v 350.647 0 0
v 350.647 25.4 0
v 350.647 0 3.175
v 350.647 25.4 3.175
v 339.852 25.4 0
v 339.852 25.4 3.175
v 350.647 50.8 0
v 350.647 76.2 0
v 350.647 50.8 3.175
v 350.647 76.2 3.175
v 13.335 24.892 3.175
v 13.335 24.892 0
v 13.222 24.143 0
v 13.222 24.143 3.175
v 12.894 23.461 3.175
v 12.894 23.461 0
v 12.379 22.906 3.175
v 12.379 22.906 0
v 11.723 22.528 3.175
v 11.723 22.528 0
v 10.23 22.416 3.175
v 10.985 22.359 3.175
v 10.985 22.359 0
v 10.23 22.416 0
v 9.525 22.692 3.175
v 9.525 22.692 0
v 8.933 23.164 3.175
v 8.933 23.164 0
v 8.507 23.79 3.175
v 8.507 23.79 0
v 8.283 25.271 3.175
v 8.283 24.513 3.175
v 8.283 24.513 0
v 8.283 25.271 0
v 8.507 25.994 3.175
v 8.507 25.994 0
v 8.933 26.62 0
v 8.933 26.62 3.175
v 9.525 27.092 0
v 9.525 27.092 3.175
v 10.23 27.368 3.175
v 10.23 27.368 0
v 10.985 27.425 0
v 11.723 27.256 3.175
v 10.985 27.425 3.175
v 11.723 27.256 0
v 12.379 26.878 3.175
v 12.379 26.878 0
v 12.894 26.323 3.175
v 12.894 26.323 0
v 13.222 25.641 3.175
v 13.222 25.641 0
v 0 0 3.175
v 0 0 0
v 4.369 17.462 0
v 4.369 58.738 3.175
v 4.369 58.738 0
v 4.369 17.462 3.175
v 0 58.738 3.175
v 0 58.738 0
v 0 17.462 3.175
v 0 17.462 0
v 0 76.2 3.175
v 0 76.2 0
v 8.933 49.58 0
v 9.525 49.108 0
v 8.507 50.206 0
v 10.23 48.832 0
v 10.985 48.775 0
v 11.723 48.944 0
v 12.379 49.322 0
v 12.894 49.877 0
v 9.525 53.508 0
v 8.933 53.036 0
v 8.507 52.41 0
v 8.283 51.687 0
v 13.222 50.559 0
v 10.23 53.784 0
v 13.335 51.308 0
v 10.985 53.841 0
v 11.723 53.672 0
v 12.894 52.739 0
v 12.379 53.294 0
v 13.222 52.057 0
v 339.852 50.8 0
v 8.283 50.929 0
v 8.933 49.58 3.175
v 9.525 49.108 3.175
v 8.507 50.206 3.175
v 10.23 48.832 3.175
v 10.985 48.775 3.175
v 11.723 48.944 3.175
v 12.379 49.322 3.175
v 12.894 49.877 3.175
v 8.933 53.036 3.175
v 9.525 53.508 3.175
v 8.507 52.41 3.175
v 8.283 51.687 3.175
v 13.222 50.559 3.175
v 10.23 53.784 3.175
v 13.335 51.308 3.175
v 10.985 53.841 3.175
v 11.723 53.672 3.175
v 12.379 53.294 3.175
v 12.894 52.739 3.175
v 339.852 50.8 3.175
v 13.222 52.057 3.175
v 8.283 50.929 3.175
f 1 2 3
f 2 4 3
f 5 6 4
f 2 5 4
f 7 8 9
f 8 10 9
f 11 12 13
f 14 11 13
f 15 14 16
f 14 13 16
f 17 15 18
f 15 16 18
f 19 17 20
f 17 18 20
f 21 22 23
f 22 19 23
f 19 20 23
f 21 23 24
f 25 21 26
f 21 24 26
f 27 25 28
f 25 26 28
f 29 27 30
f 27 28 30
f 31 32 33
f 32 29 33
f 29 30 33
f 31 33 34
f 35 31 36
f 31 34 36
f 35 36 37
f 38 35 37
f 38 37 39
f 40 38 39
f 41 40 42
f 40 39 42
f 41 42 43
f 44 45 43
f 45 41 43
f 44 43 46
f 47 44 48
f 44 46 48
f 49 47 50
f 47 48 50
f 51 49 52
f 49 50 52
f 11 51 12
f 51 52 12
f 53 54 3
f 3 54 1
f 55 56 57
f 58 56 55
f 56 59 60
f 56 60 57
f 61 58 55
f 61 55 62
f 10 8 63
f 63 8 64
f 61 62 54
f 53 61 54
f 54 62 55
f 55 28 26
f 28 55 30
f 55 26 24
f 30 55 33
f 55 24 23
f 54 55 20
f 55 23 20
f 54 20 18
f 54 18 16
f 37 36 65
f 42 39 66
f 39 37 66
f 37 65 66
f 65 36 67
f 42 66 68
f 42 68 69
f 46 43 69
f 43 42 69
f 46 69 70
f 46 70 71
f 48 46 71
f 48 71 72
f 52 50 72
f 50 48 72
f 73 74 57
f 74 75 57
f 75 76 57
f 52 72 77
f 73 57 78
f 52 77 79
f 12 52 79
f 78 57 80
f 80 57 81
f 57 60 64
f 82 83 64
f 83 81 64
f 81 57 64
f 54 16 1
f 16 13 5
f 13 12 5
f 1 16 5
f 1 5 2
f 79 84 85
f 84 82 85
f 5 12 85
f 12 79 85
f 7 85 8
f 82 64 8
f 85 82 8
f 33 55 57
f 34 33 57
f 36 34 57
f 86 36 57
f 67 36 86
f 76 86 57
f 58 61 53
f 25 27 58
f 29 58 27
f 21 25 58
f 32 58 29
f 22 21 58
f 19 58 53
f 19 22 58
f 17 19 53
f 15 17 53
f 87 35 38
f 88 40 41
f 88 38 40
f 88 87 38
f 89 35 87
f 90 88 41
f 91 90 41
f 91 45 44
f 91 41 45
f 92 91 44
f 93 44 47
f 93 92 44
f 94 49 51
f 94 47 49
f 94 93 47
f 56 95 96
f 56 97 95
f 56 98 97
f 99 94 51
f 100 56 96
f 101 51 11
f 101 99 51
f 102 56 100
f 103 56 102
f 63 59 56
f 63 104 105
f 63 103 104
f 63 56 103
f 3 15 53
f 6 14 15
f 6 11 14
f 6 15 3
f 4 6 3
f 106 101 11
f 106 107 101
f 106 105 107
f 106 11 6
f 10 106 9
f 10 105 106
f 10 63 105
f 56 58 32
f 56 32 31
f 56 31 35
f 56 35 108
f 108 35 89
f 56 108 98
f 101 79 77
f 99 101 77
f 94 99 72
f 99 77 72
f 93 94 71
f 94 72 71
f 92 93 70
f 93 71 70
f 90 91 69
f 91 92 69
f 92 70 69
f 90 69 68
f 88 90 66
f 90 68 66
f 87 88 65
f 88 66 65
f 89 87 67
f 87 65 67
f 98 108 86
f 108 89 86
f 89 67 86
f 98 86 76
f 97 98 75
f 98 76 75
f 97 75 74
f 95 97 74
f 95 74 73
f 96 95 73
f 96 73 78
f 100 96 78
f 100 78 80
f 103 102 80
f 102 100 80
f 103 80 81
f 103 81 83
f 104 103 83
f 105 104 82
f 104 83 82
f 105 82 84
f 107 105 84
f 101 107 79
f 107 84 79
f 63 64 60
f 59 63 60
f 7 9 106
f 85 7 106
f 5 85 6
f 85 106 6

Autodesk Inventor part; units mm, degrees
ref_plane "YZ Plane" through (0, 0, 0) normal (1, 0, 0) x (0, 1, 0)
ref_plane "XZ Plane" through (0, 0, 0) normal (0, 1, 0) x (-1, 0, 0)
ref_plane "XY Plane" through (0, 0, 0) normal (0, 0, 1) x (1, 0, 0)
sketch "Sketch1" plane through (0, 0, 0) normal (0, 0, 1) x (1, 0, 0)
  line L0 (0, 0) -> (352.552, 0)
  line L1 (352.552, 0) -> (352.552, 76.2)
  line L2 (352.552, 76.2) -> (0, 76.2)
  line L3 (0, 76.2) -> (0, 0)
  circle A0 centre (10.795, 51.308) radius 2.54
  circle A1 centre (10.795, 24.892) radius 2.54
  line L4 (102.1122, 0) -> (121.213, 0)
  line L5 (102.1122, 0) -> (83.0114, 0)
  line L6 (0, 76.2) -> (10.795, 76.2)
  line L7 (0, 63.0428) -> (0, 24.8412)
  line L8 (0, 76.2) -> (10.795, 76.2)
  line L9 (3.81, 38.1) -> (3.81, 58.1025)
  line L10 (3.81, 58.1025) -> (0, 58.1025)
  line L11 (3.81, 38.1) -> (3.81, 18.0975)
  line L12 (3.81, 18.0975) -> (0, 18.0975)
  line L13 (3.81, 38.1) -> (3.81, 58.1025)
  line L14 (0, 58.1025) -> (3.81, 58.1025)
  line L15 (3.81, 58.1025) -> (3.81, 18.0975)
  line L16 (3.81, 18.0975) -> (0, 18.0975)
  line L17 (0, 18.0975) -> (0, 58.1025)
  dimension "d0" = 352.552
  dimension "d1" = 76.2
  dimension "d15" = 20.0025
extrude "Extrusion1" add sketch "Sketch1" along normal blind 3.175
sketch "Sketch2" plane through (0, 0, 3.175) normal (0, 0, 1) x (1, 0, 0)
  line L0 (352.552, 76.2) -> (0, 76.2) projected
  line L1 (352.552, 0) -> (352.552, 76.2) projected
  line L2 (352.552, 50.8) -> (339.852, 50.8)
  line L3 (339.852, 50.8) -> (339.852, 25.4)
  line L4 (339.852, 25.4) -> (352.552, 25.4)
  line L5 (352.552, 25.4) -> (352.552, 50.8)
  point P0 (0, 0)
  dimension "d6" = 25.4
  dimension "d7" = 12.7
  dimension "d8" = 25.4
extrude "Extrusion2" cut sketch "Sketch2" against normal blind 25.4
sketch "Sketch3" plane through (0, 0, 3.175) normal (0, 0, 1) x (1, 0, 0)
  point P0 (0, 0)
sketch "Sketch4" plane through (0, 0, 3.175) normal (0, 0, 1) x (1, 0, 0)
  point P0 (0, 0)
sketch "Sketch5" plane through (0, 0, 3.175) normal (0, 0, 1) x (1, 0, 0)
  circle A0 centre (10.795, 51.308) radius 2.54 projected
  circle A1 centre (10.795, 24.892) radius 2.54 projected
  line L0 (0, 76.2) -> (0, 0) projected
  line L1 (0, 38.1) -> (0, 58.7375)
  line L2 (0, 58.7375) -> (4.3688, 58.7375)
  line L3 (4.3688, 58.7375) -> (4.3688, 17.4625)
  line L4 (4.3688, 17.4625) -> (0, 17.4625)
  line L5 (0, 17.4625) -> (0, 38.1)
  point P0 (0, 17.4625)
  dimension "d16" = 20.6375
  dimension "d17" = 4.3688
extrude "Extrusion3" cut sketch "Sketch5" against normal blind 25.4 contours L2 L3 L4 L0
sketch "Sketch6" plane through (0, 0, 3.175) normal (0, 0, 1) x (1, 0, 0)
  line L0 (352.552, 50.8) -> (352.552, 76.2) projected
  line L1 (0, 0) -> (352.552, 0) projected
  line L2 (352.552, 76.2) -> (350.647, 76.2)
  line L3 (350.647, 76.2) -> (350.647, 0)
  line L4 (350.647, 0) -> (352.552, 0)
  line L5 (352.552, 0) -> (352.552, 76.2)
  point P0 (352.552, 0)
  dimension "d21" = 1.905
extrude "Extrusion4" cut sketch "Sketch6" against normal blind 25.4
properties part number "220310 Back Cover"
